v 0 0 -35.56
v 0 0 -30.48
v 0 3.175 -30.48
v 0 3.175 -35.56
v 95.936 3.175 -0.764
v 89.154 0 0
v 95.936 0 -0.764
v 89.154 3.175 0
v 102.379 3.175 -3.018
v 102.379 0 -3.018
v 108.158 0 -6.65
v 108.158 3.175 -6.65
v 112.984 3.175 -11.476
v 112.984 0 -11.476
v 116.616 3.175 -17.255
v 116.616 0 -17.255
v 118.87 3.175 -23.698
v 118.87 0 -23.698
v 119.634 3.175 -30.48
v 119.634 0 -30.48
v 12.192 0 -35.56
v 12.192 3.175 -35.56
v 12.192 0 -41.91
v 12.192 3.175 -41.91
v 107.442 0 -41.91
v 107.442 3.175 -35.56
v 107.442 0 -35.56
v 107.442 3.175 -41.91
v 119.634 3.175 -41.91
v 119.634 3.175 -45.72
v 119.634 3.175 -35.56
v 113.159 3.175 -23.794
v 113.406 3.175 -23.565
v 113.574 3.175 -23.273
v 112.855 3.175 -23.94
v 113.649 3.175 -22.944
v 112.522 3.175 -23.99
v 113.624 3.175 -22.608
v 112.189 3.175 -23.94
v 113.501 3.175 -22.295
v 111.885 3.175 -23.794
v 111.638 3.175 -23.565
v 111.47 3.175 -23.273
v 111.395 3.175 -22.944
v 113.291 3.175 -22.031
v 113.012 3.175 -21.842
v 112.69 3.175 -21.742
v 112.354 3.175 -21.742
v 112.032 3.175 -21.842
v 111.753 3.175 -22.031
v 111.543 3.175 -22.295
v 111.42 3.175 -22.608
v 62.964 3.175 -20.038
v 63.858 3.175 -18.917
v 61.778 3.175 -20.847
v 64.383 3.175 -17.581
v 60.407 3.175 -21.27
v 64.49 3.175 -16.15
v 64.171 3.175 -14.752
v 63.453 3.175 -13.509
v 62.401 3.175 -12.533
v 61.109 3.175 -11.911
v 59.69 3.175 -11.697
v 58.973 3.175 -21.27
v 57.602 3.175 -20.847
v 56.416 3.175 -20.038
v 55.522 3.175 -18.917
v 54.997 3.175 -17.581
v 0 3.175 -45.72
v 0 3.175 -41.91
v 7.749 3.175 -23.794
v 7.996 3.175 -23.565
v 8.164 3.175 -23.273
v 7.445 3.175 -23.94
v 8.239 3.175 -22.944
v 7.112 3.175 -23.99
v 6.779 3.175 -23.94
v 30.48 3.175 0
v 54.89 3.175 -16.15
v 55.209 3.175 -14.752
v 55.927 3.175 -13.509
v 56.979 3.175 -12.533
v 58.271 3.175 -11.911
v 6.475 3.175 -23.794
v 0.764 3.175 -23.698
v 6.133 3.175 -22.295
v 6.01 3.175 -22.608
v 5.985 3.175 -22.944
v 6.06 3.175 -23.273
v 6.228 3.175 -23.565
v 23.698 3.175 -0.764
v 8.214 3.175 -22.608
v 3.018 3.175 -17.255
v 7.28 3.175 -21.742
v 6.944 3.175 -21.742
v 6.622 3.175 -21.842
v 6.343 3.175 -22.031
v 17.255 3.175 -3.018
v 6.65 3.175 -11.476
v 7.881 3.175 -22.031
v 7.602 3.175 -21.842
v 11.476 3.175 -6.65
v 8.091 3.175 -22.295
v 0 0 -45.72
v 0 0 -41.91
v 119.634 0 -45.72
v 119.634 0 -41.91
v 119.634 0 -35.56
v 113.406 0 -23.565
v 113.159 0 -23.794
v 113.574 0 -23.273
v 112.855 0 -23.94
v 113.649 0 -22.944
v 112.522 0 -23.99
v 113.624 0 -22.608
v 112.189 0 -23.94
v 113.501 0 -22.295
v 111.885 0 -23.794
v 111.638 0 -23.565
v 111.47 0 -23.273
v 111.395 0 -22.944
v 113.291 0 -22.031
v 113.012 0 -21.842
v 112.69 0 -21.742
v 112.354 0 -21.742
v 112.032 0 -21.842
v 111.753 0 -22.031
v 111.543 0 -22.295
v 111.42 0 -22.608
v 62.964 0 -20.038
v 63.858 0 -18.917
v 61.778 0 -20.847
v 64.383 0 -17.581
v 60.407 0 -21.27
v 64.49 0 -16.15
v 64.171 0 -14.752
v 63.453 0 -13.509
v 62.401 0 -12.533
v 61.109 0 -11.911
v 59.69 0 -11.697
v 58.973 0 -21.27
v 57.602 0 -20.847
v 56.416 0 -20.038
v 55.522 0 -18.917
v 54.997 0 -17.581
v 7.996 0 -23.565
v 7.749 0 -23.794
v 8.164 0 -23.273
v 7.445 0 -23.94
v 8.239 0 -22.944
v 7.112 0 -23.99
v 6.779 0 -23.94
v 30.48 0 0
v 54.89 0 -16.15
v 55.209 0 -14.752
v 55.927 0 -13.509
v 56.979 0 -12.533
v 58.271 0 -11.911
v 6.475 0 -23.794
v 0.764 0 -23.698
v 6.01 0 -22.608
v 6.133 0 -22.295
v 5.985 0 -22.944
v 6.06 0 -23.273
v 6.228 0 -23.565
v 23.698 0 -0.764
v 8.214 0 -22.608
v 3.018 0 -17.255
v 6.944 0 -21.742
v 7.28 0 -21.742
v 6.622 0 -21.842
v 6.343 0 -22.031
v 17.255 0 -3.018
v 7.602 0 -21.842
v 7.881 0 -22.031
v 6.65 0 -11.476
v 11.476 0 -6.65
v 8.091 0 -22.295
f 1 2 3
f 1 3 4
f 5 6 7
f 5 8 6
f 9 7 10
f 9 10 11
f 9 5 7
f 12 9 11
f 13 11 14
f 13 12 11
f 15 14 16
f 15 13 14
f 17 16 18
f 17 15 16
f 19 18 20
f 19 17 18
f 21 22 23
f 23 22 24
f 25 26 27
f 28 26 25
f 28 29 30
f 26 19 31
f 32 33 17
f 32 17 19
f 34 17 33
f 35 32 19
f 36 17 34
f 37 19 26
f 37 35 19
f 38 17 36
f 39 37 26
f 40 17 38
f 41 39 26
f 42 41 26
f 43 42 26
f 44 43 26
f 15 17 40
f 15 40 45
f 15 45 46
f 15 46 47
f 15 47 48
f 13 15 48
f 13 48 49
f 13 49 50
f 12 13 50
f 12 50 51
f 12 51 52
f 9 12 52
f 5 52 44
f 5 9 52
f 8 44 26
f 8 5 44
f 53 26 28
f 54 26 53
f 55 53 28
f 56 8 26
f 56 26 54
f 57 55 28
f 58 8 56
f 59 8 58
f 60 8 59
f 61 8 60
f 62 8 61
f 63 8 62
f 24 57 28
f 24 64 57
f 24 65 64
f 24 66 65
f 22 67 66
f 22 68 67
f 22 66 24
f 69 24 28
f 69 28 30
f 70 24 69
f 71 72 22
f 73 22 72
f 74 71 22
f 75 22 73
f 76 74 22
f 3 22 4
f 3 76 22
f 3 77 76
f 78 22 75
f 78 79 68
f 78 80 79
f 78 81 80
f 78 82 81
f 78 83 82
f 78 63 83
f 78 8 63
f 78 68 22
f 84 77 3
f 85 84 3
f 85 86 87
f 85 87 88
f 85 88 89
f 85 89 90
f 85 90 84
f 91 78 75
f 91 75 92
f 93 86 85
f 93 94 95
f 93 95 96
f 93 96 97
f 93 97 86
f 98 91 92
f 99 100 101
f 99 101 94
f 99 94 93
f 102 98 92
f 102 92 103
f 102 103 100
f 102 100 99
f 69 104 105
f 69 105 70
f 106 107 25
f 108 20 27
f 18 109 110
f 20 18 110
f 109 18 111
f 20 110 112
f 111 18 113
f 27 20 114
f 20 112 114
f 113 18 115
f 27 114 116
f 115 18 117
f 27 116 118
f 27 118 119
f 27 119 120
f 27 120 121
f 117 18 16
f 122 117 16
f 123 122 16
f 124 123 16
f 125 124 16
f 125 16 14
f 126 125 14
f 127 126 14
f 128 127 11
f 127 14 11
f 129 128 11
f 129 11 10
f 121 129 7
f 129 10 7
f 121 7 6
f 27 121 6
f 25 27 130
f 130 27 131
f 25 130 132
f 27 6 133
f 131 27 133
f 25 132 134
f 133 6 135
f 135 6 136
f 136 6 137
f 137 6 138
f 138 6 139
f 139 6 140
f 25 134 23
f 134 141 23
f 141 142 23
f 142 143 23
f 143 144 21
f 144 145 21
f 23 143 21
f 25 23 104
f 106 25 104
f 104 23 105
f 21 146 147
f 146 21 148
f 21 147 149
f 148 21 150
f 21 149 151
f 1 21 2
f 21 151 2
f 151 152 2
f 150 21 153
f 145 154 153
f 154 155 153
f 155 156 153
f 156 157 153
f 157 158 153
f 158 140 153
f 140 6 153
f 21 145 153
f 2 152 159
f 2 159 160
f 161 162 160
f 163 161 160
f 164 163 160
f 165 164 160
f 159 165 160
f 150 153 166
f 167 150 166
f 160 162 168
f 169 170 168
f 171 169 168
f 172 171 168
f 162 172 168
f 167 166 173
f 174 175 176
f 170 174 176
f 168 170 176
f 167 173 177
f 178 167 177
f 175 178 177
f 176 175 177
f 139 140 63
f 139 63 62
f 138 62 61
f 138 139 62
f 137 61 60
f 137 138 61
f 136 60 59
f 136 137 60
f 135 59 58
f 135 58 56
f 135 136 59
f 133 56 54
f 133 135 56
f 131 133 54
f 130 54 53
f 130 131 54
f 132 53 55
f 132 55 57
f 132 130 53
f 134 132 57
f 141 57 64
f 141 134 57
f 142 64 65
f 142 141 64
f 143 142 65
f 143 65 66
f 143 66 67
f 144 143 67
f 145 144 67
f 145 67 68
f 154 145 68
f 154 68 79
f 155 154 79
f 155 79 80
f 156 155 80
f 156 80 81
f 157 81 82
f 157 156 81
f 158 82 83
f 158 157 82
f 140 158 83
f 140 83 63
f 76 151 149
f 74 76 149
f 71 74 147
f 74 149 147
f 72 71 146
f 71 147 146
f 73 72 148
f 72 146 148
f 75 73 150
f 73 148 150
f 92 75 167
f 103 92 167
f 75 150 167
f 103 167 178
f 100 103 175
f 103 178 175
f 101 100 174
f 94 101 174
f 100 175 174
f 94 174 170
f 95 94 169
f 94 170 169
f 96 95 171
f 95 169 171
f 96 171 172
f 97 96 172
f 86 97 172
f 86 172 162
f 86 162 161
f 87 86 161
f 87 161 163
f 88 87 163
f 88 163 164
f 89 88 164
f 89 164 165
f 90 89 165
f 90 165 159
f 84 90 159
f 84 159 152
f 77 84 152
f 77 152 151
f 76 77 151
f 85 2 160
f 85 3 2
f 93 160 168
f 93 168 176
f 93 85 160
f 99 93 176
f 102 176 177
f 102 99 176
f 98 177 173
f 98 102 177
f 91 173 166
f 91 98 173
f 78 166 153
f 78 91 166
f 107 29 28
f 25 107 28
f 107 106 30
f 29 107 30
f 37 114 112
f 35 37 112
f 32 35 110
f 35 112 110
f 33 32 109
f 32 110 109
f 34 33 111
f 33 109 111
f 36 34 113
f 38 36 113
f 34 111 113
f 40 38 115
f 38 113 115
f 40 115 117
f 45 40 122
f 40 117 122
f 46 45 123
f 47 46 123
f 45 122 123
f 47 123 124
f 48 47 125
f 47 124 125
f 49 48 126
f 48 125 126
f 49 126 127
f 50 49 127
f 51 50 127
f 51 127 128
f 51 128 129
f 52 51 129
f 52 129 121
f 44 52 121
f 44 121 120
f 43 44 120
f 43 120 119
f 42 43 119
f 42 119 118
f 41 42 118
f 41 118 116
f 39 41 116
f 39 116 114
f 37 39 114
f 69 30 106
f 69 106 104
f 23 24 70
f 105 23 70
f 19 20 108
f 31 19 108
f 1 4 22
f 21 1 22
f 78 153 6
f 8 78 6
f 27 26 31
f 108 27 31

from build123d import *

# Parameters (mm, degrees)
SKETCH1_W           = 119.634
SKETCH1_H           = 41.91
SKETCH1_R           = 4.8133
BOSS_EXTRUDE1_DEPTH = 3.175
SKETCH3_W           = 12.192
SKETCH3_H           = 6.35
CUT_EXTRUDE2_DEPTH  = 22.352
FILLET1_R           = 30.48
SKETCH4_W           = 119.634
SKETCH4_H           = 3.175
BOSS_EXTRUDE2_DEPTH = 3.81
SKETCH5_R           = 1.1303
CUT_EXTRUDE3_DEPTH  = 6.35
SKETCH6_R           = 1.1303
CUT_EXTRUDE4_DEPTH  = 6.35


with BuildPart() as part:
    # Sketch1 → Boss-Extrude1 (new body)
    with BuildSketch(Plane(origin=(0, 0, 0), x_dir=(1, 0, 0), z_dir=(0, 1, 0))):
        with Locations((59.817, 20.955)):
            Rectangle(SKETCH1_W, SKETCH1_H)
        with Locations(Location((59.69, 16.51, 0), (0, 0, 270))):
            Circle(SKETCH1_R, mode=Mode.SUBTRACT)
    extrude(amount=BOSS_EXTRUDE1_DEPTH)

    # Sketch3 → Cut-Extrude2 (cut)
    with BuildSketch(Plane(origin=(0, 3.175, 0), x_dir=(1, 0, 0), z_dir=(0, 1, 0))):
        with Locations((6.096, 38.735)):
            Rectangle(SKETCH3_W, SKETCH3_H)
        with Locations((113.538, 38.735)):
            Rectangle(SKETCH3_W, SKETCH3_H)
    extrude(amount=-CUT_EXTRUDE2_DEPTH, mode=Mode.SUBTRACT)

    # Fillet1
    fillet1_edges = [part.edges().sort_by_distance(p)[0] for p in [
        (119.634, 1.5875, 0),
        (0, 1.5875, 0),
    ]]
    fillet(fillet1_edges, radius=FILLET1_R)

    # Sketch4 → Boss-Extrude2 (add)
    with BuildSketch(Plane(origin=(0, 0, -41.91), x_dir=(-1, 0, 0), z_dir=(0, 0, -1))):
        with Locations((-59.817, 1.5875)):
            Rectangle(SKETCH4_W, SKETCH4_H)
    extrude(amount=BOSS_EXTRUDE2_DEPTH)

    # Sketch5 → Cut-Extrude3 (cut)
    with BuildSketch(Plane.XZ):
        with Locations(Location((7.112, -22.86, 0), (0, 0, 270))):
            Circle(SKETCH5_R)
    extrude(amount=-CUT_EXTRUDE3_DEPTH, mode=Mode.SUBTRACT)

    # Sketch6 → Cut-Extrude4 (cut)
    with BuildSketch(Plane.XZ):
        with Locations(Location((112.522, -22.86, 0), (0, 0, 270))):
            Circle(SKETCH6_R)
    extrude(amount=-CUT_EXTRUDE4_DEPTH, mode=Mode.SUBTRACT)


solid = part.part
